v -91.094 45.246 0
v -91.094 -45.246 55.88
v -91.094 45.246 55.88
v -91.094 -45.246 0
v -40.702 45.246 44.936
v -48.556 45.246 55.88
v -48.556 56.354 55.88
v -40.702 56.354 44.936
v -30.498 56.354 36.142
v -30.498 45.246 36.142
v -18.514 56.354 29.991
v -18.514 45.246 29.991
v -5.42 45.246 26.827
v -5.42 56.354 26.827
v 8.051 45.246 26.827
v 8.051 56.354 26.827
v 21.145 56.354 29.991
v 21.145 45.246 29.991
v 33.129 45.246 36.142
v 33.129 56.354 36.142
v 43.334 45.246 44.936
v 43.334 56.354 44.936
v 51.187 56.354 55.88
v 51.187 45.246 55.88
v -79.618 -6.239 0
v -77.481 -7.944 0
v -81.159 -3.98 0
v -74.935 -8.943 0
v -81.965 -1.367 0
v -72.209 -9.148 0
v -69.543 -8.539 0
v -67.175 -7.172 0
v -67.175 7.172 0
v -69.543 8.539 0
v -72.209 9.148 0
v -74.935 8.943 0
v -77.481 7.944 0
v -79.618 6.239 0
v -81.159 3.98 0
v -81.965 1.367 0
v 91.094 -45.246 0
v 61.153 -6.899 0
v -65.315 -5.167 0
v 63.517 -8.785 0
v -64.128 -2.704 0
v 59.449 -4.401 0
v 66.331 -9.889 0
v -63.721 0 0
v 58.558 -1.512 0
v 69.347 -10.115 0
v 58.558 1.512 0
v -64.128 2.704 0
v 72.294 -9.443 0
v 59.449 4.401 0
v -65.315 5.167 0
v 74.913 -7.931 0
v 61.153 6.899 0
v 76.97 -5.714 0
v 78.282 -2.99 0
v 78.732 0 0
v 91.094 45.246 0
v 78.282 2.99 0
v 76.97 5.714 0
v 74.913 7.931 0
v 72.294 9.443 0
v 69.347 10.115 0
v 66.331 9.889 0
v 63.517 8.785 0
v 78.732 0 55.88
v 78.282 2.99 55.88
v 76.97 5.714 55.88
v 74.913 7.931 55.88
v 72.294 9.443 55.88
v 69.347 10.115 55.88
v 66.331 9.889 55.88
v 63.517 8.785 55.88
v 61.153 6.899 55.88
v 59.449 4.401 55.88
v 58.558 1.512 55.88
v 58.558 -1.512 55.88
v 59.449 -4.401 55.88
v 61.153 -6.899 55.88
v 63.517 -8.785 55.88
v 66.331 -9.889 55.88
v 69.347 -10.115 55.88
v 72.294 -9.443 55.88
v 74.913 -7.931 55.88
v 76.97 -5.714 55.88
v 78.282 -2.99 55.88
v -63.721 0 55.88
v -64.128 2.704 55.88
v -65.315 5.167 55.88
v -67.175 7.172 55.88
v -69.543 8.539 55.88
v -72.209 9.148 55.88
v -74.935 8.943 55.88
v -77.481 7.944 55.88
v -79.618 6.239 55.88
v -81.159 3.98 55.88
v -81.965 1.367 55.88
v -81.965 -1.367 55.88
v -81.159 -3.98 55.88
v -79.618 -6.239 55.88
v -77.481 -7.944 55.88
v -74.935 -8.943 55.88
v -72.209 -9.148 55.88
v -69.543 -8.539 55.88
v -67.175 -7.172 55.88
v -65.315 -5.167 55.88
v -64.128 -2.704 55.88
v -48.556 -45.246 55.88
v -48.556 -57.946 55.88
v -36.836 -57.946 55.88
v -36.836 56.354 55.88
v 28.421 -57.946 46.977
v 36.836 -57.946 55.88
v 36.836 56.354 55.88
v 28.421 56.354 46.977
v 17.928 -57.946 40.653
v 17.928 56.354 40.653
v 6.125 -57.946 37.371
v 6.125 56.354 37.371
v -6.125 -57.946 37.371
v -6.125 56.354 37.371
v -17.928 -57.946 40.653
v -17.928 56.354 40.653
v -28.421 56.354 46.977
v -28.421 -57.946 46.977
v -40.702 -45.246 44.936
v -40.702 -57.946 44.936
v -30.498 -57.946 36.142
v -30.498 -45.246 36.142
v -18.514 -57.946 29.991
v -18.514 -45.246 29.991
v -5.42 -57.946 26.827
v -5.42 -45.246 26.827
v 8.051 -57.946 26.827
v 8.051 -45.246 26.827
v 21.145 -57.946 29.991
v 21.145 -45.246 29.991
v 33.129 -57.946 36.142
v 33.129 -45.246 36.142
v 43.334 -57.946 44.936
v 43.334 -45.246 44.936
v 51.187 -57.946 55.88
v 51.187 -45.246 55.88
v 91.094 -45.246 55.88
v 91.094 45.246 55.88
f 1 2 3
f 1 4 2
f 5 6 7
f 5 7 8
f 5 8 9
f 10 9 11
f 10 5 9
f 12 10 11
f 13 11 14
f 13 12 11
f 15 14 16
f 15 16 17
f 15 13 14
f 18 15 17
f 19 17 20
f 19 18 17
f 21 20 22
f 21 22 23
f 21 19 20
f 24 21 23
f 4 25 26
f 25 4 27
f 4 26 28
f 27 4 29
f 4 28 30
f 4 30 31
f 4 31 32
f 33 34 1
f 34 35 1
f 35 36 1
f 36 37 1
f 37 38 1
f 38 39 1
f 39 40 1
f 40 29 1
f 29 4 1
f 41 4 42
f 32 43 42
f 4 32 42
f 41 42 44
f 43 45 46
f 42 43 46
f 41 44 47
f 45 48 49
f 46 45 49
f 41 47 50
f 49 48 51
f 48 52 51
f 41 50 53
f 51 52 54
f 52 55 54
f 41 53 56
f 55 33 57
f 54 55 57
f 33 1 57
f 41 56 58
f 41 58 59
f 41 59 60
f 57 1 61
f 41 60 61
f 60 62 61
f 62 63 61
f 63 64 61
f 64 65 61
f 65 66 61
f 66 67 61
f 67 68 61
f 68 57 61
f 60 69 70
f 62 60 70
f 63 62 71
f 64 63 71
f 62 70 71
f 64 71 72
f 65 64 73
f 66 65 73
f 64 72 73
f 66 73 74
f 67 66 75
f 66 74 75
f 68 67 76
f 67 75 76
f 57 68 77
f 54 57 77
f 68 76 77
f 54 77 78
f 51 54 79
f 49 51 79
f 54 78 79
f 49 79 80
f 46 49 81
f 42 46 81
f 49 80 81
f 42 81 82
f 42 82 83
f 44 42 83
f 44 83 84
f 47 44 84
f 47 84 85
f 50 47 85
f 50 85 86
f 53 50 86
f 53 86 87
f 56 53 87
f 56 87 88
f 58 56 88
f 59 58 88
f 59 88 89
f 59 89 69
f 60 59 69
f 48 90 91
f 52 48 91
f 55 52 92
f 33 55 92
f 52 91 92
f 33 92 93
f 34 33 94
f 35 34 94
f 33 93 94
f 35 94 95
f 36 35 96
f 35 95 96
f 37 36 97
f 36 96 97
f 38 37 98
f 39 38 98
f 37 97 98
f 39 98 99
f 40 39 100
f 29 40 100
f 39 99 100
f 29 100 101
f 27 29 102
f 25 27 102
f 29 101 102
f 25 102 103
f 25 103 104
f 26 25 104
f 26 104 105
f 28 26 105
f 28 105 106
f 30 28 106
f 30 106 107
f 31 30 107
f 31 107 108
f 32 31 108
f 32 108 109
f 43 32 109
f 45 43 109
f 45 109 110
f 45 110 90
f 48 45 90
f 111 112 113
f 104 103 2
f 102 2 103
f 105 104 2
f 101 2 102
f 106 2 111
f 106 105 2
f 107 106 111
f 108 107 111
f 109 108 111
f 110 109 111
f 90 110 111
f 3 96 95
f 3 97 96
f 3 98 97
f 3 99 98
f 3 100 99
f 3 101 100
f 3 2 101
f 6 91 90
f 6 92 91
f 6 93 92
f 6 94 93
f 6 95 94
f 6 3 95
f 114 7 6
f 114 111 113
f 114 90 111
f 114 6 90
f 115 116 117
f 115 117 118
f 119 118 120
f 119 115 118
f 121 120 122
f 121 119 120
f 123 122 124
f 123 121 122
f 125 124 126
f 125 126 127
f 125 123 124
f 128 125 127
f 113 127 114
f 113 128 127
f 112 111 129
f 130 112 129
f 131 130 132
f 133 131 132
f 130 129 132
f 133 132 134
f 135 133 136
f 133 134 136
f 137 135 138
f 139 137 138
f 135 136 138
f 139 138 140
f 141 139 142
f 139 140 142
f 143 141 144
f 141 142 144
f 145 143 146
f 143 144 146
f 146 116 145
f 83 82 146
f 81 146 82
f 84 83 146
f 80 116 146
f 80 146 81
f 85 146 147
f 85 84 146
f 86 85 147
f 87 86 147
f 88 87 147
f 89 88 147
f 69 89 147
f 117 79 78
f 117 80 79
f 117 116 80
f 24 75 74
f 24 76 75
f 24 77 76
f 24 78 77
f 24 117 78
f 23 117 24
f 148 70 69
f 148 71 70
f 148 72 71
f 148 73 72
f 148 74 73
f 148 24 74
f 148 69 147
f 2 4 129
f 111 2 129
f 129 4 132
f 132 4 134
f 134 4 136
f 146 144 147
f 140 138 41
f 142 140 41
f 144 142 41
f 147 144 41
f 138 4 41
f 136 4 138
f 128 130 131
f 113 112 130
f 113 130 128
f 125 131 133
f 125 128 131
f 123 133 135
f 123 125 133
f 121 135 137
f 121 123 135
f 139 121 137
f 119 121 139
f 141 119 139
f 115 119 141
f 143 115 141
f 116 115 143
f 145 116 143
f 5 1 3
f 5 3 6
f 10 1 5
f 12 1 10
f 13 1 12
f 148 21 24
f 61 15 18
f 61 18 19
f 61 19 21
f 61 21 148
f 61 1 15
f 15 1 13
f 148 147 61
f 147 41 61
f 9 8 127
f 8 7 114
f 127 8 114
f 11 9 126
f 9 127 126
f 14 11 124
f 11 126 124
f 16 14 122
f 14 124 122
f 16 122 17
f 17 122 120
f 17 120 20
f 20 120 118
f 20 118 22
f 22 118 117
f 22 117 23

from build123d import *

# Parameters (mm, degrees)
F0_W          = 182.1884661913
F0_H          = 90.4913619161
F1_DEPTH      = 25.4
F2_DEPTH      = 30.48
F4_DEPTH      = 12.7
F4_DEPTH_BACK = 101.6
F5_DEPTH      = 101.601
F6_R          = 9.1731778598
F7_DEPTH      = 55.881
F8_R          = 10.143728711
F9_DEPTH      = 55.881


with BuildPart() as f1:
    # F0 (on Top) → F1 (new body)
    with BuildSketch(Plane.XY):
        Rectangle(F0_W, F0_H)
    extrude(amount=F1_DEPTH)

    # F2 (add): a face of the model
    f2_faces = [f1.faces().sort_by_distance(p)[0] for p in [
        (0, 0, 25.4),
    ]]
    extrude(f2_faces, amount=F2_DEPTH)

    # F3 (on face) → F4 (join, two sides)
    with BuildSketch(Plane.XZ.offset(45.245680958)) as f4_sk:
        with BuildLine():
            ThreePointArc((36.8356928229, 55.88), (-1.8626e-06, 36.9552895427), (-36.8356965482, 55.88))
            Line((-36.8356965482, 55.88), (-48.5561415553, 55.88))
            ThreePointArc((-48.5561415553, 55.88), (1.3155639172, 26.427666579), (51.1872693896, 55.88))
            Line((51.1872693896, 55.88), (36.8356928229, 55.88))
        make_face()
    extrude(amount=F4_DEPTH)
    extrude(f4_sk.sketch, amount=-F4_DEPTH_BACK)

    # F5 (cut, through all): a face of the model
    f5_faces = [f1.faces().sort_by_distance(p)[0] for p in [
        (-1.8626e-06, -45.245680958, 48.1558042876),
    ]]
    extrude(f5_faces, amount=-F5_DEPTH, mode=Mode.SUBTRACT)

    # F6 (on face) → F7 (cut, through all)
    with BuildSketch(Plane.XY.offset(55.88)):
        with Locations((-72.8940144181, 0)):
            Circle(F6_R)
    extrude(amount=-F7_DEPTH, mode=Mode.SUBTRACT)

    # F8 (on face) → F9 (cut, through all)
    with BuildSketch(Plane.XY.offset(55.88)):
        with Locations((68.5885474086, 0)):
            Circle(F8_R)
    extrude(amount=-F9_DEPTH, mode=Mode.SUBTRACT)


solid = f1.part
